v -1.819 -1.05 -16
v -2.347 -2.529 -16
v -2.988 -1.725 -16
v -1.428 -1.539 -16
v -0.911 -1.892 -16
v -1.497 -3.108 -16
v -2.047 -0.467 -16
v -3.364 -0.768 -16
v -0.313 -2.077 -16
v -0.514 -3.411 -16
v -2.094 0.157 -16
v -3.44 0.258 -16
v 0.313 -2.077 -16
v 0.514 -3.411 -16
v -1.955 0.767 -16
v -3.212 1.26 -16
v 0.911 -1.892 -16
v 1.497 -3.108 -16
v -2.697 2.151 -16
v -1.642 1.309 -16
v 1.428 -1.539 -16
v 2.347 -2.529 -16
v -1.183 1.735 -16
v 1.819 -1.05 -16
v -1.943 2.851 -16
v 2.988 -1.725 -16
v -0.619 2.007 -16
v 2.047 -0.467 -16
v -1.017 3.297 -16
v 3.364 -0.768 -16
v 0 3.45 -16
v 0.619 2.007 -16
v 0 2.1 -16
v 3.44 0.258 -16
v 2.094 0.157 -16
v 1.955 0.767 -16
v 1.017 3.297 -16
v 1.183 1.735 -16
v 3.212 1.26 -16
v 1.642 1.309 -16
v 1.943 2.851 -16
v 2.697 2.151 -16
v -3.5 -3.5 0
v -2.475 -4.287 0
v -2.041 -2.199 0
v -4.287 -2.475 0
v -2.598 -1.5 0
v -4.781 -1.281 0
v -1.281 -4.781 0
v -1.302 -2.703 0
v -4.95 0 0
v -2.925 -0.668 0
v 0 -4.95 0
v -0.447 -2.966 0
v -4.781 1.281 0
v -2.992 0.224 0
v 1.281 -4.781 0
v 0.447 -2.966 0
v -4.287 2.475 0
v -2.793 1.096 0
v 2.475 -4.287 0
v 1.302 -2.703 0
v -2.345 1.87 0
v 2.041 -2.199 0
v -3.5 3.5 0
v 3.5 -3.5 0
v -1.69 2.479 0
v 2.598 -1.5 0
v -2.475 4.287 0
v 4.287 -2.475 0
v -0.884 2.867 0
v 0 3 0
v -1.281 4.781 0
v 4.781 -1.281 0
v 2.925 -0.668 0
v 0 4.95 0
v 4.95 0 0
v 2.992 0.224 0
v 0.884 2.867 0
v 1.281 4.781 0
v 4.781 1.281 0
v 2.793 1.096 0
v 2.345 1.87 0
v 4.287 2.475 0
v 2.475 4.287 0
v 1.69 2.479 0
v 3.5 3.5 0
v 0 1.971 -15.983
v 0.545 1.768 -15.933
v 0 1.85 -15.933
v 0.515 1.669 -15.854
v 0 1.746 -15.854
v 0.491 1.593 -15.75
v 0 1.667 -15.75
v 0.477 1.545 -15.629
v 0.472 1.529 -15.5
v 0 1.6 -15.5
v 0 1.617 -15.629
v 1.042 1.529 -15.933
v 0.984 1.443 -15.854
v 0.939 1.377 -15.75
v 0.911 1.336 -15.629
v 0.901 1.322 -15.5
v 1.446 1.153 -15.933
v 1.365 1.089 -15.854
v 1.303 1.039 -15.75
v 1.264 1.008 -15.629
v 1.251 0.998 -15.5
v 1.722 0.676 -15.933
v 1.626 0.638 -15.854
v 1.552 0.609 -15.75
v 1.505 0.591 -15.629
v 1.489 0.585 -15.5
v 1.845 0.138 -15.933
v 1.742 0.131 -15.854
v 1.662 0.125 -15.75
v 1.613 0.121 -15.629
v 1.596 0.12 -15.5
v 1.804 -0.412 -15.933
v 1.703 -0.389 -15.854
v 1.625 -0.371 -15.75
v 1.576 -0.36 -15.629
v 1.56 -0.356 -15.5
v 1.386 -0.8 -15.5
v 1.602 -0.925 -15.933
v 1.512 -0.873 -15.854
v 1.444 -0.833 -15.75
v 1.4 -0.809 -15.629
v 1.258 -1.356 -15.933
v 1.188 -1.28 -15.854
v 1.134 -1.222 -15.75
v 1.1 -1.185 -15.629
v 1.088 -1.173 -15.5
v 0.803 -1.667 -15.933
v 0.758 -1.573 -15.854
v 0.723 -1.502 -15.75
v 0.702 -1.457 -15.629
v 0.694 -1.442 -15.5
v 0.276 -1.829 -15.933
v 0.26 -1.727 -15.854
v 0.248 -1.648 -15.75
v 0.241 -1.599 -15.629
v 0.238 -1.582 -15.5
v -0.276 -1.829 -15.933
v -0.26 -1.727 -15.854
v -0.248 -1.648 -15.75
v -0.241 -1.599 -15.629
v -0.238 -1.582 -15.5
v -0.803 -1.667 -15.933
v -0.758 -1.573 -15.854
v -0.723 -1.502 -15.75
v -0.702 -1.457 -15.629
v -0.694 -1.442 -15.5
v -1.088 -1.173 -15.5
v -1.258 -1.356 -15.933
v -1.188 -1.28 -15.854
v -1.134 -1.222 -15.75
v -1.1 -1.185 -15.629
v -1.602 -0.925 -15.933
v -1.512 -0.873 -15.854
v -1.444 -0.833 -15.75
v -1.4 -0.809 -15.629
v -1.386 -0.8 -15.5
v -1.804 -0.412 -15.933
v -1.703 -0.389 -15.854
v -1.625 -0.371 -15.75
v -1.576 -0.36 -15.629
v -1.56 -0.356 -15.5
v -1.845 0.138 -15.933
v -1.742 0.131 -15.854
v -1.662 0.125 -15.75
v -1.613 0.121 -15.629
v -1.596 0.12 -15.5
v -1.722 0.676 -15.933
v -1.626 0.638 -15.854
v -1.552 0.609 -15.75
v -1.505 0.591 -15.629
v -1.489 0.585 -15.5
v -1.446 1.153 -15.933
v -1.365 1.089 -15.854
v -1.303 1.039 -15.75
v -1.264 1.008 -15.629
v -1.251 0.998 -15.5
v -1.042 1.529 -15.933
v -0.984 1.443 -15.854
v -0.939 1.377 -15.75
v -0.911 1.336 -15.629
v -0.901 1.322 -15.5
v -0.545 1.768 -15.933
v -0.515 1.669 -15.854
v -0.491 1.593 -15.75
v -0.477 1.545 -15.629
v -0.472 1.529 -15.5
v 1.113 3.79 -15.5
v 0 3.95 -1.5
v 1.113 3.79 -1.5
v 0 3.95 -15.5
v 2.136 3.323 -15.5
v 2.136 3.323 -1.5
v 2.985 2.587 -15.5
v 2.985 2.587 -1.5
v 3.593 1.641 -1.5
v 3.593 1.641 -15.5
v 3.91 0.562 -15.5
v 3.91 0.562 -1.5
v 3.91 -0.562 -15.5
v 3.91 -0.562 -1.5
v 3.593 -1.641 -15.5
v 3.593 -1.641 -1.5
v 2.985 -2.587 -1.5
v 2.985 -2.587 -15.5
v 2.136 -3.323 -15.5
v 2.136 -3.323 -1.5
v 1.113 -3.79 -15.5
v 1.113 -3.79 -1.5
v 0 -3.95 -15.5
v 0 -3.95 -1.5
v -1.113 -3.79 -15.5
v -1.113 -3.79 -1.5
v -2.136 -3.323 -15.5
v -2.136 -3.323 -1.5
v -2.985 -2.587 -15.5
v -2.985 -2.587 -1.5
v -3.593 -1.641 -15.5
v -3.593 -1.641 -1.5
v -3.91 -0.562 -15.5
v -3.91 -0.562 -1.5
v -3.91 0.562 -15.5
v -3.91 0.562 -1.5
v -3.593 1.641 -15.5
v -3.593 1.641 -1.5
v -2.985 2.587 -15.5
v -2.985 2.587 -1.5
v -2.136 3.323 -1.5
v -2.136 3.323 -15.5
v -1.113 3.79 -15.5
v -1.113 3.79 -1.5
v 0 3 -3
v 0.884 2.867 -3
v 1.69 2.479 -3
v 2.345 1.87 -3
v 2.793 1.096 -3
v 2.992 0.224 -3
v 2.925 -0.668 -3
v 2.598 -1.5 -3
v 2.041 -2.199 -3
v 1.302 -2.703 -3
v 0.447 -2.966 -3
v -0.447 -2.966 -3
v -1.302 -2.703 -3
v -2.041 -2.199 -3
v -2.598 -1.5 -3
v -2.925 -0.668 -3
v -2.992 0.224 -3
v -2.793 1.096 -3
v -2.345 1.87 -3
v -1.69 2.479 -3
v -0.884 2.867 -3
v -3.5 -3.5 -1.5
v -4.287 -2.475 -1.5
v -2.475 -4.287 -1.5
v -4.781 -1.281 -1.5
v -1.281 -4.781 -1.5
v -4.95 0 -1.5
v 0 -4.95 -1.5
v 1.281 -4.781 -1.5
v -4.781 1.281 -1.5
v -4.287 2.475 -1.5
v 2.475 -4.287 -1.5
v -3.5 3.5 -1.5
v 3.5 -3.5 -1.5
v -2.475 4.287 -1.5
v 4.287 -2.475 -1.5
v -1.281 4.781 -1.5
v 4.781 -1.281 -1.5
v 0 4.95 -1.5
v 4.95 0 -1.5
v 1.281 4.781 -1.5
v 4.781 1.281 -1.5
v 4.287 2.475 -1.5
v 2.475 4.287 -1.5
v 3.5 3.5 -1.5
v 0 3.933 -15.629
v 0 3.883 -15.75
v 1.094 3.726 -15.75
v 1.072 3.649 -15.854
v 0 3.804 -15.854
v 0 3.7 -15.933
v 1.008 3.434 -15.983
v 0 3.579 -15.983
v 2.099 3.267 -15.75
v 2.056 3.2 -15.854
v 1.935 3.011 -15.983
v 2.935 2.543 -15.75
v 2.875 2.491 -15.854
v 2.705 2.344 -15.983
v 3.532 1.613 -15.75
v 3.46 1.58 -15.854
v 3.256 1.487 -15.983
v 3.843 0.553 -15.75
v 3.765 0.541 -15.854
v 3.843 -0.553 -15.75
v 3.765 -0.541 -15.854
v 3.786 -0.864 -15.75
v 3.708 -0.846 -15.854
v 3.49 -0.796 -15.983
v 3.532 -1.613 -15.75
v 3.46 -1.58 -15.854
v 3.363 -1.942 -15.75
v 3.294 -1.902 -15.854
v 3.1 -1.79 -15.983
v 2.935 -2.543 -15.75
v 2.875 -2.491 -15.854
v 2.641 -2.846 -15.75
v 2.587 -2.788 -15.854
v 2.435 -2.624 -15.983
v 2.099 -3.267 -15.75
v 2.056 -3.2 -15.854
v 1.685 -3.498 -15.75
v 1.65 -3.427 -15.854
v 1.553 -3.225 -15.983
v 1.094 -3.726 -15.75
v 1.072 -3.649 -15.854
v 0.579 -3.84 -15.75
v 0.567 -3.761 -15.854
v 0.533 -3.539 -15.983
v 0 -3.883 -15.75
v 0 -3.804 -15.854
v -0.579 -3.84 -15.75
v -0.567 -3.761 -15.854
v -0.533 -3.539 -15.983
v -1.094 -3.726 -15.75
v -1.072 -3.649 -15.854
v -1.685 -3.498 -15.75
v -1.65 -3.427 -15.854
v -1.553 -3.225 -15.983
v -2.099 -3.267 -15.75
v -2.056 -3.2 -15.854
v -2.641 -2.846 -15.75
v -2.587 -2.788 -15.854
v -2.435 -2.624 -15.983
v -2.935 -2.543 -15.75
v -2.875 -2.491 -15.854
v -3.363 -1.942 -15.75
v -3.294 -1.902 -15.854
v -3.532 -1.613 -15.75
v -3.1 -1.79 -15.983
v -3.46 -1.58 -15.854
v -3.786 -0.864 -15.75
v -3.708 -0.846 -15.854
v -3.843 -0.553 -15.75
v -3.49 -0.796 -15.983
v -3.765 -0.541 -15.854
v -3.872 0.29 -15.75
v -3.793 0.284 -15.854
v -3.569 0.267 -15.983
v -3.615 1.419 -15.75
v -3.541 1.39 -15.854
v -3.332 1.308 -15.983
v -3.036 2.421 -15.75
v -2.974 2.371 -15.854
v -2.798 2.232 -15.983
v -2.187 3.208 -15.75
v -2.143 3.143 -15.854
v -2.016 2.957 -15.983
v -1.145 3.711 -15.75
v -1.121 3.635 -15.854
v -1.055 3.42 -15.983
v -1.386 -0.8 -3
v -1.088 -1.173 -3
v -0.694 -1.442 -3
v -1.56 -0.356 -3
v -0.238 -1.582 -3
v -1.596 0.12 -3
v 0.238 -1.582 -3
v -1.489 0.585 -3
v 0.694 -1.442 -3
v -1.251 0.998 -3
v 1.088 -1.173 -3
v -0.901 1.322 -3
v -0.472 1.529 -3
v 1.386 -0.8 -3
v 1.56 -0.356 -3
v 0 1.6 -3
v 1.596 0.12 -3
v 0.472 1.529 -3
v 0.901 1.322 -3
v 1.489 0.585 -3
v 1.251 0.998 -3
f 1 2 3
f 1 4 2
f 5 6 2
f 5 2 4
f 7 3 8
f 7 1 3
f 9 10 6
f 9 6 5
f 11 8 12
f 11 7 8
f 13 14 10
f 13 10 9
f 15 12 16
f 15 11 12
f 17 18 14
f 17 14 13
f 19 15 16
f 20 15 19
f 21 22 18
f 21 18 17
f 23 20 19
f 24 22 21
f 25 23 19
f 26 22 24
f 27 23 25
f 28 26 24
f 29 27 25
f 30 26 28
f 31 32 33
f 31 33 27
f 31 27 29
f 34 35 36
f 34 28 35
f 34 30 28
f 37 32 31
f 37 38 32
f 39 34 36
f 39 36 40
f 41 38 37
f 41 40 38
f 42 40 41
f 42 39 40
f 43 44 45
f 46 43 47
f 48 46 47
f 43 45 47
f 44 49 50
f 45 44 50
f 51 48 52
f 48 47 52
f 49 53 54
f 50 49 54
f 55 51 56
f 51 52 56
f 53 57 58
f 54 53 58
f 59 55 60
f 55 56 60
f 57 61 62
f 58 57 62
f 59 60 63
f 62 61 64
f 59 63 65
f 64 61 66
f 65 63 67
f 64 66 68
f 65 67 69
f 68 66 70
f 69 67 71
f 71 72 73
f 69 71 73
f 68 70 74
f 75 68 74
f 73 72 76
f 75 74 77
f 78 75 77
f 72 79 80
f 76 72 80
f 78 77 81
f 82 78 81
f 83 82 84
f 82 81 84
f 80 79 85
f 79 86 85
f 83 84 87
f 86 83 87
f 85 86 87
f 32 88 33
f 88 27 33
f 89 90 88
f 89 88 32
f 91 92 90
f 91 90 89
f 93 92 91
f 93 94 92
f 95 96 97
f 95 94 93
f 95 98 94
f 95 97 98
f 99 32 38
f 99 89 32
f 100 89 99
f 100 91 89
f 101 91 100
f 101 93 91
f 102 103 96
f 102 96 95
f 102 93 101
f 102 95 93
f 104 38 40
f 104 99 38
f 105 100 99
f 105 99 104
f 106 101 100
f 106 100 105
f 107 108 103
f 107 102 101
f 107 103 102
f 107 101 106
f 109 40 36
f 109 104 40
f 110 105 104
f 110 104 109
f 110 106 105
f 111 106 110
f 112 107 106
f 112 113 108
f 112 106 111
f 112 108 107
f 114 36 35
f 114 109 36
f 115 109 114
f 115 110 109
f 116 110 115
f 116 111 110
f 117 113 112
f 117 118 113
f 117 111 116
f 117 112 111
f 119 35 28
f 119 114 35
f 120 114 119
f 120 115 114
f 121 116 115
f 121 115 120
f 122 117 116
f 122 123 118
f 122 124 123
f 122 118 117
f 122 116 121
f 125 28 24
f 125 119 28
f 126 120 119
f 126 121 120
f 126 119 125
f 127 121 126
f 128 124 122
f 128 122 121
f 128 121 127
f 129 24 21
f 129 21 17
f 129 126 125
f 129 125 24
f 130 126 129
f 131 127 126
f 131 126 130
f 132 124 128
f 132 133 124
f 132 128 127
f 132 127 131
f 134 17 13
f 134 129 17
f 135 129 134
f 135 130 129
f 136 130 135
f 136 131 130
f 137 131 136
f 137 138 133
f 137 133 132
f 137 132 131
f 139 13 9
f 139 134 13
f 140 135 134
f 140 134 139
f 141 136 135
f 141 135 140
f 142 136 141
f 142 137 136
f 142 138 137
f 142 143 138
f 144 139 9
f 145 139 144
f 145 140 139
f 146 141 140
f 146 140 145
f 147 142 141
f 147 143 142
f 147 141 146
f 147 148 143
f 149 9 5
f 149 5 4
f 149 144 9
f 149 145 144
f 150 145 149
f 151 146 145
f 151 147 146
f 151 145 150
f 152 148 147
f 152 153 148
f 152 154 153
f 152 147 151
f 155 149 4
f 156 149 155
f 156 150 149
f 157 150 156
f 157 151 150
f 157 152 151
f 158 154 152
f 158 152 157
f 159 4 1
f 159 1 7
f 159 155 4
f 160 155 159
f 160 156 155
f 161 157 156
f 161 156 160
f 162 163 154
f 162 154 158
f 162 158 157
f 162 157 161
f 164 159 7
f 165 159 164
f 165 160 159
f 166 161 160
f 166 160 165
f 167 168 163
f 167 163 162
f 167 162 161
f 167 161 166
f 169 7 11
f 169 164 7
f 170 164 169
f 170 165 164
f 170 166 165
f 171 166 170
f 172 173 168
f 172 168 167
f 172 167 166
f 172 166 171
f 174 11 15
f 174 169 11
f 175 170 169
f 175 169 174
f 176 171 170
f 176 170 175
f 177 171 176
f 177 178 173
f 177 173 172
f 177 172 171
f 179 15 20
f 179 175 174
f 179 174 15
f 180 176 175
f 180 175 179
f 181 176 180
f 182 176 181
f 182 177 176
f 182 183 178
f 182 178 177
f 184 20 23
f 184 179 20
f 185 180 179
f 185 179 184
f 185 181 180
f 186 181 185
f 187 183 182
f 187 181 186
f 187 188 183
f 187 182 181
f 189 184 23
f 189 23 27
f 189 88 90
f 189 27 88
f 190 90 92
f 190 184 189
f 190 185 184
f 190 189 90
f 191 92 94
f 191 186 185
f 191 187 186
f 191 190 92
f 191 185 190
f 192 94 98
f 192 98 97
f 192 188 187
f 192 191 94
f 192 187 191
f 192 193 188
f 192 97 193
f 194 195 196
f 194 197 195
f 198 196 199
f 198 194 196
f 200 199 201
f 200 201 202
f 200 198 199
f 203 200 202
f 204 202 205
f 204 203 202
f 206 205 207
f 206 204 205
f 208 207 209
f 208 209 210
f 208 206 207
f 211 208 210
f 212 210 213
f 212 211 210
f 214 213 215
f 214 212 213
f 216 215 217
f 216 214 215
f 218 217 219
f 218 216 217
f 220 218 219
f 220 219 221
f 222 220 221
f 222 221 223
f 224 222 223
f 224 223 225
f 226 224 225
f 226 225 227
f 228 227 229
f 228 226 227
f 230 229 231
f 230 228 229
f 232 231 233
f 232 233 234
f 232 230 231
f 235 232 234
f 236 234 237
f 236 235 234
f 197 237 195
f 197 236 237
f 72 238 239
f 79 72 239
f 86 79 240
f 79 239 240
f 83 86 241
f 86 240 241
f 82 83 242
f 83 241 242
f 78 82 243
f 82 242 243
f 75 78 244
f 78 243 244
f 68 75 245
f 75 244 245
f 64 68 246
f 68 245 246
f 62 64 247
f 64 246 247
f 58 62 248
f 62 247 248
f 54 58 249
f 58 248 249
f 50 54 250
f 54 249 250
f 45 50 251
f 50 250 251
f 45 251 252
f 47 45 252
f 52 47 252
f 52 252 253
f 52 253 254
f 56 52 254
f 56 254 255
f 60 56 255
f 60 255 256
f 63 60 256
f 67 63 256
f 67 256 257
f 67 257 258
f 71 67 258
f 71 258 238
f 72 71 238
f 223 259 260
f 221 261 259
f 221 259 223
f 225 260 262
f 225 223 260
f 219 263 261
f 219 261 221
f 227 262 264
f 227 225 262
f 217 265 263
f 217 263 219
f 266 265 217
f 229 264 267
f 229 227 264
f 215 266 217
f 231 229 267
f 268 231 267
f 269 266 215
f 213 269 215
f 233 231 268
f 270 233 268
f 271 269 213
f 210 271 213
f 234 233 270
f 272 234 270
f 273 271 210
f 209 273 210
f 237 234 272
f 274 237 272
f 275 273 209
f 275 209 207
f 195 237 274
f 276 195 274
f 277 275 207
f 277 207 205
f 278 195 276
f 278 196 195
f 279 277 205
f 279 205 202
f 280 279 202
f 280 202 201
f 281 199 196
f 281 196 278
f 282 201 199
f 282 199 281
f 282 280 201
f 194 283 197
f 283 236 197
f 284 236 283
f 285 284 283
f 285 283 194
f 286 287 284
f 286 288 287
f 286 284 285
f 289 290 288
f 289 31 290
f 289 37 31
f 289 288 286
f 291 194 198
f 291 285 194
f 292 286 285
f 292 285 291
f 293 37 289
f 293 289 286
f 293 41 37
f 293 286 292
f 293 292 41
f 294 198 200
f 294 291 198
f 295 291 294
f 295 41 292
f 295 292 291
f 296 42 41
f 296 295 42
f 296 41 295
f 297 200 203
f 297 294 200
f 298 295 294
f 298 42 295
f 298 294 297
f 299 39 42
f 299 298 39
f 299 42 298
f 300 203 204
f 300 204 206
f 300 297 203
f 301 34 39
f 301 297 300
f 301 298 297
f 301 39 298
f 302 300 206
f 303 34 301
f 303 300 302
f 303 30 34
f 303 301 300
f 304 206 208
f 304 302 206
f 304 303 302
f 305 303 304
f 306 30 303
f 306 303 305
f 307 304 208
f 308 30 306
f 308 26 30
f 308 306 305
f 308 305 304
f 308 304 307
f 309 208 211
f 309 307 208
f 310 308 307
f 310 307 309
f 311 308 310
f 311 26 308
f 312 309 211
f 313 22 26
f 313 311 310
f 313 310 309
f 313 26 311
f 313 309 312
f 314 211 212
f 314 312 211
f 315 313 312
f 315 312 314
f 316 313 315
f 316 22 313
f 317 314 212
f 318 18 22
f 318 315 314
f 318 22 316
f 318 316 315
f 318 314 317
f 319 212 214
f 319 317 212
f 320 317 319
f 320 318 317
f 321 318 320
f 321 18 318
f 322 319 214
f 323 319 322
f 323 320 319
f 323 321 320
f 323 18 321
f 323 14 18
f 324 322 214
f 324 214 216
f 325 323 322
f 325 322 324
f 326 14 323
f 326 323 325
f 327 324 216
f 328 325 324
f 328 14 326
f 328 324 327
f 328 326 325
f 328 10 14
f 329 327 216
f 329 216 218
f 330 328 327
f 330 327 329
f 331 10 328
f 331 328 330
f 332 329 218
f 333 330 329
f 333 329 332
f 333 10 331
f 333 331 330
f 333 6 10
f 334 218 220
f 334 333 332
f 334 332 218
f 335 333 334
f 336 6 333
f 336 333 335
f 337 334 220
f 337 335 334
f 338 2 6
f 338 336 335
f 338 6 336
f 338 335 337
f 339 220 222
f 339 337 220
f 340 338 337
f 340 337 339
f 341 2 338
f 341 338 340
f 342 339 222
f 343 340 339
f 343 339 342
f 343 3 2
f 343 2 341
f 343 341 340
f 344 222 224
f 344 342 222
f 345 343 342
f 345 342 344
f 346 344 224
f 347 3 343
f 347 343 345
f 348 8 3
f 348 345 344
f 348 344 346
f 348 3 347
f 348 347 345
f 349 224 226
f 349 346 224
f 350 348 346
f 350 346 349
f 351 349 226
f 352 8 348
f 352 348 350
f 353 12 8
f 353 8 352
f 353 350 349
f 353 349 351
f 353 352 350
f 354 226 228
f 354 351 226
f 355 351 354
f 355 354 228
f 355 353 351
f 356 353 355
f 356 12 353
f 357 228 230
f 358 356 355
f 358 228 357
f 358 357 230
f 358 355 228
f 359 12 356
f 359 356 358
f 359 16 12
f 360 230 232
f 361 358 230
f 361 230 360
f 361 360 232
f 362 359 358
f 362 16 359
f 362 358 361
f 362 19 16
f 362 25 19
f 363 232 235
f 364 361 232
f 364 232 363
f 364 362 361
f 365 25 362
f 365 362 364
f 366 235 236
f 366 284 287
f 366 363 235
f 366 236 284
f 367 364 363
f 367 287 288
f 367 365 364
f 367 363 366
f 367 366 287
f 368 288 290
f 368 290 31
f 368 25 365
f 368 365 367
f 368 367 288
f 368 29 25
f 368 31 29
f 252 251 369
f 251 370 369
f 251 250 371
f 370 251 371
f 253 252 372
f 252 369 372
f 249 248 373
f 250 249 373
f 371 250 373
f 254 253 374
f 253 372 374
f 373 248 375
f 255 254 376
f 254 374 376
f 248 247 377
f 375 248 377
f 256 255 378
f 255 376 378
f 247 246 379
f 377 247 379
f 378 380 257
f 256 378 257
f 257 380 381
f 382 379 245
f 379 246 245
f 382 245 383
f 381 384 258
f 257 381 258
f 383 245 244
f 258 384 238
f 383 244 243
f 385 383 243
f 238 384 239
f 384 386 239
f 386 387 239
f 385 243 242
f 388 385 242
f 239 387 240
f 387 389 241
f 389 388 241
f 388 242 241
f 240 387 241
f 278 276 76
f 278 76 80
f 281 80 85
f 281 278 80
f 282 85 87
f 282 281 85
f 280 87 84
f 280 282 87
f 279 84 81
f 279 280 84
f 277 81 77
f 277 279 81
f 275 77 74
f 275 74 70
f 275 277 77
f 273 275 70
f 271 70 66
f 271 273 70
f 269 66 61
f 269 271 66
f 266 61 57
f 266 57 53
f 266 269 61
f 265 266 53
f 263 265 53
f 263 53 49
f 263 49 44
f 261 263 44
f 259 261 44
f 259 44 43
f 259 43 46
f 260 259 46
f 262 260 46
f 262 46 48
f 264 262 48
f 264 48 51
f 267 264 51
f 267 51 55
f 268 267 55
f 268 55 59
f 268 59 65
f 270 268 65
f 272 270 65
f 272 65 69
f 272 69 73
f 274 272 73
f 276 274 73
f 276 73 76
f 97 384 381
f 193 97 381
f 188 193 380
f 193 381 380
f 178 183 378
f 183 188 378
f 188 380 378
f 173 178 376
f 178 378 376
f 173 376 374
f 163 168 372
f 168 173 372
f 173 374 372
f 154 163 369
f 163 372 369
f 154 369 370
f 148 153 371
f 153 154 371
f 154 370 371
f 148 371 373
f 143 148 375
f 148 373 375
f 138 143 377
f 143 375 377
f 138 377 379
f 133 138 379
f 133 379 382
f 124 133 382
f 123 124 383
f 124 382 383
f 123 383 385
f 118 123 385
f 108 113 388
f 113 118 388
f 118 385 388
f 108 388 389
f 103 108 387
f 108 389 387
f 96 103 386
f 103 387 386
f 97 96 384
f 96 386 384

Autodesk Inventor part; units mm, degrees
ref_plane "YZ Plane" through (0, 0, 0) normal (1, 0, 0) x (0, 1, 0)
ref_plane "XZ Plane" through (0, 0, 0) normal (0, 1, 0) x (-1, 0, 0)
ref_plane "XY Plane" through (0, 0, 0) normal (0, 0, 1) x (1, 0, 0)
sketch "Sketch1" plane through (0, 0, 0) normal (1, 0, 0) x (0, 1, 0)
  line L0 (0, 0) -> (1.65, 0) construction
  line L1 (1.65, 0) -> (3, 0) construction
  line L2 (4.95, 0) -> (4.95, -1.5)
  line L3 (4.95, -1.5) -> (3.95, -1.5)
  line L4 (3.95, -1.5) -> (3.95, -16)
  line L5 (3.95, -16) -> (1.6, -16)
  line L6 (1.6, -16) -> (1.6, -3)
  line L7 (0, 0) -> (0, -13.7466) construction
  line L8 (3, 0) -> (3, -3)
  line L9 (3, -3) -> (1.6, -3)
  line L10 (3, 0) -> (4.95, 0)
  dimension "d0" = 1.6
  dimension "d1" = 3.95
  dimension "d2" = 1
  dimension "d3" = 1.5
  dimension "d4" = 14.5
  dimension "d6" = 3
  dimension "d7" = 3
revolve "Revolution1" add sketch "Sketch1" angle 360 about axis through (0, 0, 0) along (0, 0, -1)
fillet "Fillet1" radius 0.5 2 edges at (0, -1.6, -16) (0, -3.95, -16)
properties part number "HD_BearingShaft2"
